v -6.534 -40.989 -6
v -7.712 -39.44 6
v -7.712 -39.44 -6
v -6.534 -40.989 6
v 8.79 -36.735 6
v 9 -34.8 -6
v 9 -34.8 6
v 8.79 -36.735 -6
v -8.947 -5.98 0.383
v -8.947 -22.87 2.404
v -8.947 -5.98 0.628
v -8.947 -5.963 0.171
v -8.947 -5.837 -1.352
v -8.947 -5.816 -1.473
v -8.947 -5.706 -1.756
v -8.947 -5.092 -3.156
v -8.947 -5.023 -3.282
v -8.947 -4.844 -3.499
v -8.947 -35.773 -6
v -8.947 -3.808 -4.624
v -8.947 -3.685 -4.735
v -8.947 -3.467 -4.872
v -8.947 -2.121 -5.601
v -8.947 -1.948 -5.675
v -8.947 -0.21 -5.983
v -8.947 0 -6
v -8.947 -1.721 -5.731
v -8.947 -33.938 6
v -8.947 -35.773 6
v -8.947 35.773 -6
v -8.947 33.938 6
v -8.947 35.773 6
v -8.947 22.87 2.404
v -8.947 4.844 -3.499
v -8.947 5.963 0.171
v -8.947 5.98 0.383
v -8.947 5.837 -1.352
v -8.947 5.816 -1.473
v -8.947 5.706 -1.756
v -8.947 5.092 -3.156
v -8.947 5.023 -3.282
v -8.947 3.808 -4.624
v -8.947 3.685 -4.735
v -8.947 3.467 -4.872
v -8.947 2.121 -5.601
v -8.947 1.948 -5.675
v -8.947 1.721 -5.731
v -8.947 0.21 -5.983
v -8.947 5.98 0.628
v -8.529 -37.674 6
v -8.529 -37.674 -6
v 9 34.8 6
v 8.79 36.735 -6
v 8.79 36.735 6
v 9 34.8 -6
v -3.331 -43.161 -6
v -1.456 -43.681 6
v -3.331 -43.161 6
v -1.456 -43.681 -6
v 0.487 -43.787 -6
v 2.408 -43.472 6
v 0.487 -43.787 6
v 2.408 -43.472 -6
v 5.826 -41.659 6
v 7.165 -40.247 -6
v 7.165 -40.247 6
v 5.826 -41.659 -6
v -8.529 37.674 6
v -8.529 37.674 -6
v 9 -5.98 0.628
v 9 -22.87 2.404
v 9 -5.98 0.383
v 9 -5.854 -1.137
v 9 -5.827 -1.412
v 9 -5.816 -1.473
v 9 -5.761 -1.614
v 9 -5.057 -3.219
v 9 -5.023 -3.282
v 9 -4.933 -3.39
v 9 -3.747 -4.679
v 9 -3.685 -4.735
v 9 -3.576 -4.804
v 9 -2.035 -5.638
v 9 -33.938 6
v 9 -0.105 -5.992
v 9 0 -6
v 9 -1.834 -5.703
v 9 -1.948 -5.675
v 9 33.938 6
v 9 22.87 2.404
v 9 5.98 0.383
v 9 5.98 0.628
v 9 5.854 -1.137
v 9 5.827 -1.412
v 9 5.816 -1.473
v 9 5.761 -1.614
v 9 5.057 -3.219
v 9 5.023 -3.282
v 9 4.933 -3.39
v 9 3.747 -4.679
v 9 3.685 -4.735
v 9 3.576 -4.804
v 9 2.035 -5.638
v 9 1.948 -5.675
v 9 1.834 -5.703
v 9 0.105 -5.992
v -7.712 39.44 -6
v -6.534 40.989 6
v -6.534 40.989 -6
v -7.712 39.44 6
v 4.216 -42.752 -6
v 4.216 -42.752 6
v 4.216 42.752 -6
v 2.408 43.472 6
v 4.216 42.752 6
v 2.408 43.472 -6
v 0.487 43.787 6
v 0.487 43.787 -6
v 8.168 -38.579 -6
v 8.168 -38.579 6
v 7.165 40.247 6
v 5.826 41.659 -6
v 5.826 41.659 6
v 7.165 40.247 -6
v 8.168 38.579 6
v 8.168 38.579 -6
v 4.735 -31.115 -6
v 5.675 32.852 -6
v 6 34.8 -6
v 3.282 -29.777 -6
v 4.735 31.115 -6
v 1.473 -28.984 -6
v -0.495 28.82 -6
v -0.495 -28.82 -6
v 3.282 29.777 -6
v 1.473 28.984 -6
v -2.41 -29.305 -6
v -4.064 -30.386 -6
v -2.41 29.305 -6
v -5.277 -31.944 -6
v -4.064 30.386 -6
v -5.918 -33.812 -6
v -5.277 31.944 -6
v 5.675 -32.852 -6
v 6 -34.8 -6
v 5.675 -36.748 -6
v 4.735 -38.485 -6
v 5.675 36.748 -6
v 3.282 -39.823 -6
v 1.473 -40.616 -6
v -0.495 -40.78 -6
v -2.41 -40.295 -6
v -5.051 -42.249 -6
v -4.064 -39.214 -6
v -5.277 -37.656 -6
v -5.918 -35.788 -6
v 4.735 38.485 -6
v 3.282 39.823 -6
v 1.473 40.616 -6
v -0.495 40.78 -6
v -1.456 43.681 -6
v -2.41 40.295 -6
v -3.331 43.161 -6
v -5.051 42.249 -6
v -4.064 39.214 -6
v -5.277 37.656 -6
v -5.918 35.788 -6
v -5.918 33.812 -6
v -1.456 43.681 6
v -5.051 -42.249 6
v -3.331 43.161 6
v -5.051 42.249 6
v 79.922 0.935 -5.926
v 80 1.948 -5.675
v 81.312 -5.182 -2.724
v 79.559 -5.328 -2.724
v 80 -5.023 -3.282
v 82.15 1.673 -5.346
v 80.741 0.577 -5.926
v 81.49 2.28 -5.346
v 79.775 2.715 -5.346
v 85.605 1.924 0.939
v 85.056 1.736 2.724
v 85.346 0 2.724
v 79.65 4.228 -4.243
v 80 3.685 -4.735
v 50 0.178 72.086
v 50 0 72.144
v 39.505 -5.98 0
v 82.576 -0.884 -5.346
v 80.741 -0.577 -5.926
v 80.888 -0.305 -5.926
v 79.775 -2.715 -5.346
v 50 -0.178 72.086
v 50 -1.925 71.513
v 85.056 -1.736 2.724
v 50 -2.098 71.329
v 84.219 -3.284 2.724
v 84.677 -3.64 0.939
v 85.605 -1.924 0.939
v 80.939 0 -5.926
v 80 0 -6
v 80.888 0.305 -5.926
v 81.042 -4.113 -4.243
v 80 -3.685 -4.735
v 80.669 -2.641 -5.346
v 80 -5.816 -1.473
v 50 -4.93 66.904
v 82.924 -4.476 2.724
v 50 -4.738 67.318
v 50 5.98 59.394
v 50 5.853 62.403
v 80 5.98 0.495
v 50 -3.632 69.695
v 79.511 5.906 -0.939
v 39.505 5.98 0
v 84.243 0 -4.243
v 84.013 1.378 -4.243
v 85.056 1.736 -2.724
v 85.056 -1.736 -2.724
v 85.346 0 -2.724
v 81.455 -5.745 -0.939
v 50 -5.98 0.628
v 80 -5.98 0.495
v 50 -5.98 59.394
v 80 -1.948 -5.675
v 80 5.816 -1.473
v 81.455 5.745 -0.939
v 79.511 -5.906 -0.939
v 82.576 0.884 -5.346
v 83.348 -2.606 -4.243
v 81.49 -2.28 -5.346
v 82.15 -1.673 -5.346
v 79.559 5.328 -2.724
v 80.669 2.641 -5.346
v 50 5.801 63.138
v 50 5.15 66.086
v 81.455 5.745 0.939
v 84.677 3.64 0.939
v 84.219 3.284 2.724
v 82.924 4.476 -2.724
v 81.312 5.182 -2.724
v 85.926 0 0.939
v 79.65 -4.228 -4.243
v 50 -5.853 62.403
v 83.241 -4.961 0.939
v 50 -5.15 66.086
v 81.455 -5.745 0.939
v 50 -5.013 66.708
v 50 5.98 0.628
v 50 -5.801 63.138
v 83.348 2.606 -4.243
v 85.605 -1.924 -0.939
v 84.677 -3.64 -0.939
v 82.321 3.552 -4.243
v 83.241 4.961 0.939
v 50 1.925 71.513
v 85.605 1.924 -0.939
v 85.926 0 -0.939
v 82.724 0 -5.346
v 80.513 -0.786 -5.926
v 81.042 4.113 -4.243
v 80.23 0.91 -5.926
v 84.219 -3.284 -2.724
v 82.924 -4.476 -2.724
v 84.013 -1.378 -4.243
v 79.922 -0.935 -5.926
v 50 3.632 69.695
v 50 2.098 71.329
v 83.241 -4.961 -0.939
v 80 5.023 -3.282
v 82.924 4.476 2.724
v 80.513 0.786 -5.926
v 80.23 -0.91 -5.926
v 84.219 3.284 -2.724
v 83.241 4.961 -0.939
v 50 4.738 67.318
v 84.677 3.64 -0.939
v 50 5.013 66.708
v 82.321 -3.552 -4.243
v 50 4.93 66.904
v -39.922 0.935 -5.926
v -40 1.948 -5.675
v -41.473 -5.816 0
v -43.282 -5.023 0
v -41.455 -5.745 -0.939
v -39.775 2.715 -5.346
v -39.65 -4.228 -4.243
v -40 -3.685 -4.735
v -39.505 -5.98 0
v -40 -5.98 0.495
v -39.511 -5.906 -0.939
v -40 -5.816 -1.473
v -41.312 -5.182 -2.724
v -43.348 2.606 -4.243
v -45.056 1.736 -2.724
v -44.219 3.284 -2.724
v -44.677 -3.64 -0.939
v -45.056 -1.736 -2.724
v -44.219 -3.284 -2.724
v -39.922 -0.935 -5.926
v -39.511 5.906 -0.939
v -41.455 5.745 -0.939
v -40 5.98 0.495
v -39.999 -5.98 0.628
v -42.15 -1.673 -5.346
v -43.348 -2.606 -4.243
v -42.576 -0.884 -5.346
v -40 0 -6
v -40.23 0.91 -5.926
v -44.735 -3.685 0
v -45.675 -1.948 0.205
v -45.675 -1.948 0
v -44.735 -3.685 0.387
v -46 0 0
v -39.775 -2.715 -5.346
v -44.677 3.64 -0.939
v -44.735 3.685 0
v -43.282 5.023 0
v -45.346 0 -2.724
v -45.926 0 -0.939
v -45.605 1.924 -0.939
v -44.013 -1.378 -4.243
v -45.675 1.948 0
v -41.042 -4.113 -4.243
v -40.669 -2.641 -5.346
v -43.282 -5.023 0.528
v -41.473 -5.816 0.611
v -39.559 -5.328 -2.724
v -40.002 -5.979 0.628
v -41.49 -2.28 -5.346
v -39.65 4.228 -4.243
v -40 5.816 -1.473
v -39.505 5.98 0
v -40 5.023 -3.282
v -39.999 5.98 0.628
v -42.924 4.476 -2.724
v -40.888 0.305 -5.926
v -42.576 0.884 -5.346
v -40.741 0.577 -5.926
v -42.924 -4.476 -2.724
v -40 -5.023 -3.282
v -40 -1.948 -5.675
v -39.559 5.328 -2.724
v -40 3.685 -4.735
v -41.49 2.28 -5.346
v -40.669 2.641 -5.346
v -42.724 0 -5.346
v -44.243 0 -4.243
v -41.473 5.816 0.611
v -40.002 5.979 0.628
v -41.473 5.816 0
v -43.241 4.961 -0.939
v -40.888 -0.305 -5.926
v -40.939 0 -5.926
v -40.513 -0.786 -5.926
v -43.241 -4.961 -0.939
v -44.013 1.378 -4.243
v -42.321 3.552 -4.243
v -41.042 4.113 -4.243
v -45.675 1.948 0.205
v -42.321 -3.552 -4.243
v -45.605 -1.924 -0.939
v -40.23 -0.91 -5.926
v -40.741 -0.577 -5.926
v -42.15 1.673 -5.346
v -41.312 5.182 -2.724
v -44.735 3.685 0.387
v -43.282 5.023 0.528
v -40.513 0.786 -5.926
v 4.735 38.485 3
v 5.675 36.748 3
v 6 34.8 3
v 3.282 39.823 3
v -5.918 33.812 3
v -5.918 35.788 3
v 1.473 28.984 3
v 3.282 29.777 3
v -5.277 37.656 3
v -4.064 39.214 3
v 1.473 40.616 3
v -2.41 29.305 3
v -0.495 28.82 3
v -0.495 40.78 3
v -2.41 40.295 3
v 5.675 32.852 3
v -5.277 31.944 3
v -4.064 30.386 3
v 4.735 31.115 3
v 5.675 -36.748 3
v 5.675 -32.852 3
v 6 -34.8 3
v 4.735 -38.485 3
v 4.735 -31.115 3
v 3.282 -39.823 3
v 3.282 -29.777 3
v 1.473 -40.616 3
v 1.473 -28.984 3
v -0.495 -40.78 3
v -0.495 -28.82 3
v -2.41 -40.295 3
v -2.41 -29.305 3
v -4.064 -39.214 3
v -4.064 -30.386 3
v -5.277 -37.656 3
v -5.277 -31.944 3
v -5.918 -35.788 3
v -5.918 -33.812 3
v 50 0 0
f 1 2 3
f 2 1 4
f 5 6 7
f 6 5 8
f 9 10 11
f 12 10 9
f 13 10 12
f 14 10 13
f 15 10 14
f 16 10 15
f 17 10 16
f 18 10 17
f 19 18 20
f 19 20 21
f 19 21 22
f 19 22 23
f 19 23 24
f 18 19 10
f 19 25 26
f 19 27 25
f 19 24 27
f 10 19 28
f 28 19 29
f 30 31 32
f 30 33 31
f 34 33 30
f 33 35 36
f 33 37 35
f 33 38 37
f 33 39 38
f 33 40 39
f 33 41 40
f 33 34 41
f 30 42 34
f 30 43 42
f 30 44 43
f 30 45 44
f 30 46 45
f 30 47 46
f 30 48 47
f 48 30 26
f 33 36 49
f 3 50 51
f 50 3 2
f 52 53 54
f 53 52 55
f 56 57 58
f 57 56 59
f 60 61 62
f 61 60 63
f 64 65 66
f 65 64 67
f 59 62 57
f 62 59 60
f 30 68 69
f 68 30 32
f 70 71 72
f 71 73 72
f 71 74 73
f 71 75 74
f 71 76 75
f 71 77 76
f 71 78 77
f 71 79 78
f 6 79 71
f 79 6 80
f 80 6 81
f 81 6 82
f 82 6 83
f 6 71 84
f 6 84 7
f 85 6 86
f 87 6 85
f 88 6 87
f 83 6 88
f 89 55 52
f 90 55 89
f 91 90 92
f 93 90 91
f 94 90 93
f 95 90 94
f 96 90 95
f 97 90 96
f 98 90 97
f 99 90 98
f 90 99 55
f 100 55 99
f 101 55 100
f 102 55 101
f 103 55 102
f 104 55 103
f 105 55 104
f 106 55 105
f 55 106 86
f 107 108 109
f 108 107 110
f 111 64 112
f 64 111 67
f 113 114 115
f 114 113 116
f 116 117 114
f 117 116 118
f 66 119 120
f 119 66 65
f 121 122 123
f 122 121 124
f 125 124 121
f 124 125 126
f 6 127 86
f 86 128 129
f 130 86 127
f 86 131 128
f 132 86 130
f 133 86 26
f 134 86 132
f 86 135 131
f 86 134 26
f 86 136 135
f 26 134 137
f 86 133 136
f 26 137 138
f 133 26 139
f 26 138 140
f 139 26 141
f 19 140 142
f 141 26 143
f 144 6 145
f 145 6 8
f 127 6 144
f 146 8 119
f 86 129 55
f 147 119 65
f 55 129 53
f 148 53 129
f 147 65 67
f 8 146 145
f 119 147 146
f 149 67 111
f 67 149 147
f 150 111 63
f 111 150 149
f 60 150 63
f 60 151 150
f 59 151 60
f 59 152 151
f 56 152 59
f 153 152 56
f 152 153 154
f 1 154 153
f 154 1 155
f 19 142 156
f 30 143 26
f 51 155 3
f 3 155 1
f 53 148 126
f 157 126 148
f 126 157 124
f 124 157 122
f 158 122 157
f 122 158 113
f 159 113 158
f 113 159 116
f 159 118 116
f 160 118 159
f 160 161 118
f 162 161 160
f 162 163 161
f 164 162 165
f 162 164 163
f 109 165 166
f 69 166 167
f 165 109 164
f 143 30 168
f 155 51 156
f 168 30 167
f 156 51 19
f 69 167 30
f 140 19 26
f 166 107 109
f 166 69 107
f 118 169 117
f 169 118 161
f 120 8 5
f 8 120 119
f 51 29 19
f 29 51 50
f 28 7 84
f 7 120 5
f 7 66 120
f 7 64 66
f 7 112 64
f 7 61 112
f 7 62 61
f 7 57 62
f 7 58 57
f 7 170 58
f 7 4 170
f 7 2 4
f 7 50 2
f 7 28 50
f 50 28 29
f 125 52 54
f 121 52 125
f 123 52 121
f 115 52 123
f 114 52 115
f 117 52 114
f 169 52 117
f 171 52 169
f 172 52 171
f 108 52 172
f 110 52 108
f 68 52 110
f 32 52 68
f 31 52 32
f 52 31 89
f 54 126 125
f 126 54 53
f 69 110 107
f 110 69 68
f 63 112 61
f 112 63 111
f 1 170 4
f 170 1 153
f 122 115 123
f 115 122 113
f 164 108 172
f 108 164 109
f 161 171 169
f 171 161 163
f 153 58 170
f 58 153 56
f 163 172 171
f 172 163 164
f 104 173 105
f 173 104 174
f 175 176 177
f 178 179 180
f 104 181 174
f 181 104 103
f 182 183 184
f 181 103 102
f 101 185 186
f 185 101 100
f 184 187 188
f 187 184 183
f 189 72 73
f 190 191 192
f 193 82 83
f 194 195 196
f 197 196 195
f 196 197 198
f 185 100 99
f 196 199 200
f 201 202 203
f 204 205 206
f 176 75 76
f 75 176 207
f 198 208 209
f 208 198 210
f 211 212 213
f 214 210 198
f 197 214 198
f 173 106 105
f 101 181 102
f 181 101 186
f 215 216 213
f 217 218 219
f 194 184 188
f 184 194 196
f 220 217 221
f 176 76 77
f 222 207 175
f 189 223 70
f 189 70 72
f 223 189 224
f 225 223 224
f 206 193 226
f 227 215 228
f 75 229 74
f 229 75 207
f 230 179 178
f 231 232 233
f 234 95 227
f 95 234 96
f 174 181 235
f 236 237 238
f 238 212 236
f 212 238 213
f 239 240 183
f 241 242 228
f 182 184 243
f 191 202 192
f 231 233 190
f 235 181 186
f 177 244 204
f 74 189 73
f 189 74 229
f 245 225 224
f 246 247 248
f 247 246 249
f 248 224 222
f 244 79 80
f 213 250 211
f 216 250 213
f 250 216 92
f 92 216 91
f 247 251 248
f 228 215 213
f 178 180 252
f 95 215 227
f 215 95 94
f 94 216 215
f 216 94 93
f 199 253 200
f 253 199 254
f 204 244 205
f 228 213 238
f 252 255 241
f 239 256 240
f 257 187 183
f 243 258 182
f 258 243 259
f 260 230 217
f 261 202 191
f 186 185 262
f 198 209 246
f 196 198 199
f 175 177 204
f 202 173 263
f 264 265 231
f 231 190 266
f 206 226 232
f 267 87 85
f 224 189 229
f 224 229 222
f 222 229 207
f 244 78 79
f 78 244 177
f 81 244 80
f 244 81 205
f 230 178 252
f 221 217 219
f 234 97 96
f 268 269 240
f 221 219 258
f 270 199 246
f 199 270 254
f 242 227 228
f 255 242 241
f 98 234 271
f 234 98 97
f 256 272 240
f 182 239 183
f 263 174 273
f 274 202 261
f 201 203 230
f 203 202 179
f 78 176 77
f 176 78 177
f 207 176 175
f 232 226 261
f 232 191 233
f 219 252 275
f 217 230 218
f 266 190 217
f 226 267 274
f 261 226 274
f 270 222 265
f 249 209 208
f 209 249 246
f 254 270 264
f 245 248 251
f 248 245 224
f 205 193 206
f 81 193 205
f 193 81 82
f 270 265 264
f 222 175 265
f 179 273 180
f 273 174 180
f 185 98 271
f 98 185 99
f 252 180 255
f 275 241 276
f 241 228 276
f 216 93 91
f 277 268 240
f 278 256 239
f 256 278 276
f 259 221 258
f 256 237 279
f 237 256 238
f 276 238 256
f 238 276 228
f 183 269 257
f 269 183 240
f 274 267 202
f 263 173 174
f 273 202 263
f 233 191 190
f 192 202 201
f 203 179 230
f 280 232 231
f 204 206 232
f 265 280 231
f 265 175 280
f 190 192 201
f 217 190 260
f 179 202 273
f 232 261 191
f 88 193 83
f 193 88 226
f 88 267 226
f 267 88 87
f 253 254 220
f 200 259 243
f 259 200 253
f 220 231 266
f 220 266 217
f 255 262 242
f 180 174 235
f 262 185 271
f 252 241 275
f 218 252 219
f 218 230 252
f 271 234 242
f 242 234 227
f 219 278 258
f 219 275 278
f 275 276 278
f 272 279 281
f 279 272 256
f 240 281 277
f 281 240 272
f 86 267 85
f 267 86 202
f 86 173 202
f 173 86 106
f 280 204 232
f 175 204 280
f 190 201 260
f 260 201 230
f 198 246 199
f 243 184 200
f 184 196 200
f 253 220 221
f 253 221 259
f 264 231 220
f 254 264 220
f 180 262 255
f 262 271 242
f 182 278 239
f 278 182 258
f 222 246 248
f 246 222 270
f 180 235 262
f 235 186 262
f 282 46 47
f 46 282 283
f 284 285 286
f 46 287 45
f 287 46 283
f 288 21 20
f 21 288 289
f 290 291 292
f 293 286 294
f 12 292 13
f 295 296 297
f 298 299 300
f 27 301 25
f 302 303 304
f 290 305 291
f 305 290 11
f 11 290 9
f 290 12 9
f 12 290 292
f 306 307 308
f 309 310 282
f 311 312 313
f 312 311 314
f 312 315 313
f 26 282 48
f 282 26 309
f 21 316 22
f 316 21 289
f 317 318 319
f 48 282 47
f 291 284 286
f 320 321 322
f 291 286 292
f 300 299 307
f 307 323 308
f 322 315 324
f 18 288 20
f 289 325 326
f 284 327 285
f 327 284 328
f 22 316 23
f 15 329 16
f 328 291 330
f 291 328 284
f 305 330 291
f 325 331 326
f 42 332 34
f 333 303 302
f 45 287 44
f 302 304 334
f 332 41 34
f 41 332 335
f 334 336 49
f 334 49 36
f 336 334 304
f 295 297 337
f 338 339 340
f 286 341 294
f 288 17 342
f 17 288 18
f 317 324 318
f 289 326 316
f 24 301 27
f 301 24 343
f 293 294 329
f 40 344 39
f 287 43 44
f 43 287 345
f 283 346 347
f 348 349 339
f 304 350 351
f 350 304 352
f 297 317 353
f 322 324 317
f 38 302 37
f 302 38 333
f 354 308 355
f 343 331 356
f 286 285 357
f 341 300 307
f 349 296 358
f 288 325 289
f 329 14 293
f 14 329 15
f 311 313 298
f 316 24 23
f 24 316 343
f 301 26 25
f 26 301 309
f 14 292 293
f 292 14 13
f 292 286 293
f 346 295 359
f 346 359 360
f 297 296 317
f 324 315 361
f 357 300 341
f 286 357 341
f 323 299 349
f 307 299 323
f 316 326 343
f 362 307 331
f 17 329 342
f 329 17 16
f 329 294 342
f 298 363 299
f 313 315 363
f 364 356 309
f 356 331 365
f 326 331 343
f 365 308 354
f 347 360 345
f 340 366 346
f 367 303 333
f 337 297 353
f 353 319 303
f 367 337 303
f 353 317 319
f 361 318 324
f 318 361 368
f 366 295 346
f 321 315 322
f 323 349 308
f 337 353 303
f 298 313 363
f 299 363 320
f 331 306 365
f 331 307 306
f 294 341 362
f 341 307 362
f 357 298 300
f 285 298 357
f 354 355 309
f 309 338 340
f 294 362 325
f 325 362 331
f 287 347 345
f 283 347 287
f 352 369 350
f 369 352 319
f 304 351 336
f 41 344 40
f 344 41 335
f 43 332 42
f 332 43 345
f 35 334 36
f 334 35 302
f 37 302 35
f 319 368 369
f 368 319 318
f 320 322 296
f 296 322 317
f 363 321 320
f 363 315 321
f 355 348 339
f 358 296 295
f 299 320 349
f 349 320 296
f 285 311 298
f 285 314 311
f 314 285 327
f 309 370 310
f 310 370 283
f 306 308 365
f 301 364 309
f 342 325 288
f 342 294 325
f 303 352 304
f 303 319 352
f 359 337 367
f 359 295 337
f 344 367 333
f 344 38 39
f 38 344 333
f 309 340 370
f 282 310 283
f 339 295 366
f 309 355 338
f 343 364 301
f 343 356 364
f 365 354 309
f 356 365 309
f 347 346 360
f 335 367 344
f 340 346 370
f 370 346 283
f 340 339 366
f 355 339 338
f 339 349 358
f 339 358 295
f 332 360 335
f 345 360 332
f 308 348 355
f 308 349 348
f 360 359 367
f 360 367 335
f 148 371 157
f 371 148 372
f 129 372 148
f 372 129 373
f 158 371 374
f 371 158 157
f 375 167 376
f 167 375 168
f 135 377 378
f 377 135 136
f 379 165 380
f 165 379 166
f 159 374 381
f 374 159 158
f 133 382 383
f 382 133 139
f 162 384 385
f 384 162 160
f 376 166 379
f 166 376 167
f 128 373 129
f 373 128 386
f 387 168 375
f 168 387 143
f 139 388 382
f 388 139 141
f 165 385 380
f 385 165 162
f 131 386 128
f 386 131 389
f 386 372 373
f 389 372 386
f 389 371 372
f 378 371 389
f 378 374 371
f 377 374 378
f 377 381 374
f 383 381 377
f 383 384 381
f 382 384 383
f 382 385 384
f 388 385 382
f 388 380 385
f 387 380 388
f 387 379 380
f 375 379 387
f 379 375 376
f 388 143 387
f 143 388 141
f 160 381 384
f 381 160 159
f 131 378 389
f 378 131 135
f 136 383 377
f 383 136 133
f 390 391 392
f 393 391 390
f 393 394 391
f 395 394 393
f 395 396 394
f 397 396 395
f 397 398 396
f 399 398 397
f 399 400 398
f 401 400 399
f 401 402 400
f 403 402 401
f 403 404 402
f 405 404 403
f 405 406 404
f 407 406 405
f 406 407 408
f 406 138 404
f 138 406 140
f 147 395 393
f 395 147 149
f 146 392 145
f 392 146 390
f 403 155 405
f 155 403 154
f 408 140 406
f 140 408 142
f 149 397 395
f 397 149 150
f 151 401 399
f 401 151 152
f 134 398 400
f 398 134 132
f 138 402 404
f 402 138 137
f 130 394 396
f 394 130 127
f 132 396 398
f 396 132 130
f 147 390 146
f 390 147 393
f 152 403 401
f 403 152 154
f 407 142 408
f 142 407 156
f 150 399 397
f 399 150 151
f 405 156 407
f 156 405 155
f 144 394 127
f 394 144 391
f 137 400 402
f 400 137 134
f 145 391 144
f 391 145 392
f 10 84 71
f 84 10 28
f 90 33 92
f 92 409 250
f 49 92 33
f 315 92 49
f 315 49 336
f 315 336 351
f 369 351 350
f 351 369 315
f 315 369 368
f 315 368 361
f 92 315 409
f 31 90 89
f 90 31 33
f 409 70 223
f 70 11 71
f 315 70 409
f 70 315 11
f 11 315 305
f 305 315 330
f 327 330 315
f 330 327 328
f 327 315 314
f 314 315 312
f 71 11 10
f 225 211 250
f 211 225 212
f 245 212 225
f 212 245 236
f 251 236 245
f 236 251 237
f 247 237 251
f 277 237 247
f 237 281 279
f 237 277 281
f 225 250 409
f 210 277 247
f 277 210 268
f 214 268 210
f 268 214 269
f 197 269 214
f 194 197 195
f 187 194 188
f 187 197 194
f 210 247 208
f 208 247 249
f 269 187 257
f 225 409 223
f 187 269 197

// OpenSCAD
r_rod = 6;
r_zaxes = (81.6 - 2*r_rod)/2;
thickness = 3;
w_spool = 80;
h_mount = 2*r_rod;
r_spool = 220/2;
h_spool = 100;

difference() {
  union() {
    hull() {
      z_rod(r_rod+thickness);
      mirror([0, 1, 0]) {
        z_rod(r_rod+thickness);
      }
    }

    // arms
    arm(x = h_spool/2, w_spool, r = r_rod);
    mirror([1, 0, 0]) {
      arm(w_spool/2, w_spool, r = r_rod);
    }
  }
  translate([0, 0, -thickness]) {
    #z_rod(r_rod);
    #mirror([0, 1, 0]) {
      z_rod(r_rod);
    }
  }
  translate([0, 0, r_spool]) {
    rotate([0, 90, 0]) {
      #cylinder(h = h_spool, r = r_spool, center = true);
    }
  }
}

module z_rod(r) {
  translate([0, r_zaxes, 0])
  cylinder(h = h_mount, r = r, center = true);
}

module arm(x, z, r) {
  hull() {
    translate([x/2, 0, 0]) {
      rotate([0, 90, 0]) {
        cylinder(h = x, r = r, center = true);
      }
    }
    translate([x, 0, 0]) {
      sphere(r);
    }
    translate([w_spool/2, 0, w_spool/2]) {
      cylinder(h = w_spool, r = r_rod, center = true);
    }
  }
}
